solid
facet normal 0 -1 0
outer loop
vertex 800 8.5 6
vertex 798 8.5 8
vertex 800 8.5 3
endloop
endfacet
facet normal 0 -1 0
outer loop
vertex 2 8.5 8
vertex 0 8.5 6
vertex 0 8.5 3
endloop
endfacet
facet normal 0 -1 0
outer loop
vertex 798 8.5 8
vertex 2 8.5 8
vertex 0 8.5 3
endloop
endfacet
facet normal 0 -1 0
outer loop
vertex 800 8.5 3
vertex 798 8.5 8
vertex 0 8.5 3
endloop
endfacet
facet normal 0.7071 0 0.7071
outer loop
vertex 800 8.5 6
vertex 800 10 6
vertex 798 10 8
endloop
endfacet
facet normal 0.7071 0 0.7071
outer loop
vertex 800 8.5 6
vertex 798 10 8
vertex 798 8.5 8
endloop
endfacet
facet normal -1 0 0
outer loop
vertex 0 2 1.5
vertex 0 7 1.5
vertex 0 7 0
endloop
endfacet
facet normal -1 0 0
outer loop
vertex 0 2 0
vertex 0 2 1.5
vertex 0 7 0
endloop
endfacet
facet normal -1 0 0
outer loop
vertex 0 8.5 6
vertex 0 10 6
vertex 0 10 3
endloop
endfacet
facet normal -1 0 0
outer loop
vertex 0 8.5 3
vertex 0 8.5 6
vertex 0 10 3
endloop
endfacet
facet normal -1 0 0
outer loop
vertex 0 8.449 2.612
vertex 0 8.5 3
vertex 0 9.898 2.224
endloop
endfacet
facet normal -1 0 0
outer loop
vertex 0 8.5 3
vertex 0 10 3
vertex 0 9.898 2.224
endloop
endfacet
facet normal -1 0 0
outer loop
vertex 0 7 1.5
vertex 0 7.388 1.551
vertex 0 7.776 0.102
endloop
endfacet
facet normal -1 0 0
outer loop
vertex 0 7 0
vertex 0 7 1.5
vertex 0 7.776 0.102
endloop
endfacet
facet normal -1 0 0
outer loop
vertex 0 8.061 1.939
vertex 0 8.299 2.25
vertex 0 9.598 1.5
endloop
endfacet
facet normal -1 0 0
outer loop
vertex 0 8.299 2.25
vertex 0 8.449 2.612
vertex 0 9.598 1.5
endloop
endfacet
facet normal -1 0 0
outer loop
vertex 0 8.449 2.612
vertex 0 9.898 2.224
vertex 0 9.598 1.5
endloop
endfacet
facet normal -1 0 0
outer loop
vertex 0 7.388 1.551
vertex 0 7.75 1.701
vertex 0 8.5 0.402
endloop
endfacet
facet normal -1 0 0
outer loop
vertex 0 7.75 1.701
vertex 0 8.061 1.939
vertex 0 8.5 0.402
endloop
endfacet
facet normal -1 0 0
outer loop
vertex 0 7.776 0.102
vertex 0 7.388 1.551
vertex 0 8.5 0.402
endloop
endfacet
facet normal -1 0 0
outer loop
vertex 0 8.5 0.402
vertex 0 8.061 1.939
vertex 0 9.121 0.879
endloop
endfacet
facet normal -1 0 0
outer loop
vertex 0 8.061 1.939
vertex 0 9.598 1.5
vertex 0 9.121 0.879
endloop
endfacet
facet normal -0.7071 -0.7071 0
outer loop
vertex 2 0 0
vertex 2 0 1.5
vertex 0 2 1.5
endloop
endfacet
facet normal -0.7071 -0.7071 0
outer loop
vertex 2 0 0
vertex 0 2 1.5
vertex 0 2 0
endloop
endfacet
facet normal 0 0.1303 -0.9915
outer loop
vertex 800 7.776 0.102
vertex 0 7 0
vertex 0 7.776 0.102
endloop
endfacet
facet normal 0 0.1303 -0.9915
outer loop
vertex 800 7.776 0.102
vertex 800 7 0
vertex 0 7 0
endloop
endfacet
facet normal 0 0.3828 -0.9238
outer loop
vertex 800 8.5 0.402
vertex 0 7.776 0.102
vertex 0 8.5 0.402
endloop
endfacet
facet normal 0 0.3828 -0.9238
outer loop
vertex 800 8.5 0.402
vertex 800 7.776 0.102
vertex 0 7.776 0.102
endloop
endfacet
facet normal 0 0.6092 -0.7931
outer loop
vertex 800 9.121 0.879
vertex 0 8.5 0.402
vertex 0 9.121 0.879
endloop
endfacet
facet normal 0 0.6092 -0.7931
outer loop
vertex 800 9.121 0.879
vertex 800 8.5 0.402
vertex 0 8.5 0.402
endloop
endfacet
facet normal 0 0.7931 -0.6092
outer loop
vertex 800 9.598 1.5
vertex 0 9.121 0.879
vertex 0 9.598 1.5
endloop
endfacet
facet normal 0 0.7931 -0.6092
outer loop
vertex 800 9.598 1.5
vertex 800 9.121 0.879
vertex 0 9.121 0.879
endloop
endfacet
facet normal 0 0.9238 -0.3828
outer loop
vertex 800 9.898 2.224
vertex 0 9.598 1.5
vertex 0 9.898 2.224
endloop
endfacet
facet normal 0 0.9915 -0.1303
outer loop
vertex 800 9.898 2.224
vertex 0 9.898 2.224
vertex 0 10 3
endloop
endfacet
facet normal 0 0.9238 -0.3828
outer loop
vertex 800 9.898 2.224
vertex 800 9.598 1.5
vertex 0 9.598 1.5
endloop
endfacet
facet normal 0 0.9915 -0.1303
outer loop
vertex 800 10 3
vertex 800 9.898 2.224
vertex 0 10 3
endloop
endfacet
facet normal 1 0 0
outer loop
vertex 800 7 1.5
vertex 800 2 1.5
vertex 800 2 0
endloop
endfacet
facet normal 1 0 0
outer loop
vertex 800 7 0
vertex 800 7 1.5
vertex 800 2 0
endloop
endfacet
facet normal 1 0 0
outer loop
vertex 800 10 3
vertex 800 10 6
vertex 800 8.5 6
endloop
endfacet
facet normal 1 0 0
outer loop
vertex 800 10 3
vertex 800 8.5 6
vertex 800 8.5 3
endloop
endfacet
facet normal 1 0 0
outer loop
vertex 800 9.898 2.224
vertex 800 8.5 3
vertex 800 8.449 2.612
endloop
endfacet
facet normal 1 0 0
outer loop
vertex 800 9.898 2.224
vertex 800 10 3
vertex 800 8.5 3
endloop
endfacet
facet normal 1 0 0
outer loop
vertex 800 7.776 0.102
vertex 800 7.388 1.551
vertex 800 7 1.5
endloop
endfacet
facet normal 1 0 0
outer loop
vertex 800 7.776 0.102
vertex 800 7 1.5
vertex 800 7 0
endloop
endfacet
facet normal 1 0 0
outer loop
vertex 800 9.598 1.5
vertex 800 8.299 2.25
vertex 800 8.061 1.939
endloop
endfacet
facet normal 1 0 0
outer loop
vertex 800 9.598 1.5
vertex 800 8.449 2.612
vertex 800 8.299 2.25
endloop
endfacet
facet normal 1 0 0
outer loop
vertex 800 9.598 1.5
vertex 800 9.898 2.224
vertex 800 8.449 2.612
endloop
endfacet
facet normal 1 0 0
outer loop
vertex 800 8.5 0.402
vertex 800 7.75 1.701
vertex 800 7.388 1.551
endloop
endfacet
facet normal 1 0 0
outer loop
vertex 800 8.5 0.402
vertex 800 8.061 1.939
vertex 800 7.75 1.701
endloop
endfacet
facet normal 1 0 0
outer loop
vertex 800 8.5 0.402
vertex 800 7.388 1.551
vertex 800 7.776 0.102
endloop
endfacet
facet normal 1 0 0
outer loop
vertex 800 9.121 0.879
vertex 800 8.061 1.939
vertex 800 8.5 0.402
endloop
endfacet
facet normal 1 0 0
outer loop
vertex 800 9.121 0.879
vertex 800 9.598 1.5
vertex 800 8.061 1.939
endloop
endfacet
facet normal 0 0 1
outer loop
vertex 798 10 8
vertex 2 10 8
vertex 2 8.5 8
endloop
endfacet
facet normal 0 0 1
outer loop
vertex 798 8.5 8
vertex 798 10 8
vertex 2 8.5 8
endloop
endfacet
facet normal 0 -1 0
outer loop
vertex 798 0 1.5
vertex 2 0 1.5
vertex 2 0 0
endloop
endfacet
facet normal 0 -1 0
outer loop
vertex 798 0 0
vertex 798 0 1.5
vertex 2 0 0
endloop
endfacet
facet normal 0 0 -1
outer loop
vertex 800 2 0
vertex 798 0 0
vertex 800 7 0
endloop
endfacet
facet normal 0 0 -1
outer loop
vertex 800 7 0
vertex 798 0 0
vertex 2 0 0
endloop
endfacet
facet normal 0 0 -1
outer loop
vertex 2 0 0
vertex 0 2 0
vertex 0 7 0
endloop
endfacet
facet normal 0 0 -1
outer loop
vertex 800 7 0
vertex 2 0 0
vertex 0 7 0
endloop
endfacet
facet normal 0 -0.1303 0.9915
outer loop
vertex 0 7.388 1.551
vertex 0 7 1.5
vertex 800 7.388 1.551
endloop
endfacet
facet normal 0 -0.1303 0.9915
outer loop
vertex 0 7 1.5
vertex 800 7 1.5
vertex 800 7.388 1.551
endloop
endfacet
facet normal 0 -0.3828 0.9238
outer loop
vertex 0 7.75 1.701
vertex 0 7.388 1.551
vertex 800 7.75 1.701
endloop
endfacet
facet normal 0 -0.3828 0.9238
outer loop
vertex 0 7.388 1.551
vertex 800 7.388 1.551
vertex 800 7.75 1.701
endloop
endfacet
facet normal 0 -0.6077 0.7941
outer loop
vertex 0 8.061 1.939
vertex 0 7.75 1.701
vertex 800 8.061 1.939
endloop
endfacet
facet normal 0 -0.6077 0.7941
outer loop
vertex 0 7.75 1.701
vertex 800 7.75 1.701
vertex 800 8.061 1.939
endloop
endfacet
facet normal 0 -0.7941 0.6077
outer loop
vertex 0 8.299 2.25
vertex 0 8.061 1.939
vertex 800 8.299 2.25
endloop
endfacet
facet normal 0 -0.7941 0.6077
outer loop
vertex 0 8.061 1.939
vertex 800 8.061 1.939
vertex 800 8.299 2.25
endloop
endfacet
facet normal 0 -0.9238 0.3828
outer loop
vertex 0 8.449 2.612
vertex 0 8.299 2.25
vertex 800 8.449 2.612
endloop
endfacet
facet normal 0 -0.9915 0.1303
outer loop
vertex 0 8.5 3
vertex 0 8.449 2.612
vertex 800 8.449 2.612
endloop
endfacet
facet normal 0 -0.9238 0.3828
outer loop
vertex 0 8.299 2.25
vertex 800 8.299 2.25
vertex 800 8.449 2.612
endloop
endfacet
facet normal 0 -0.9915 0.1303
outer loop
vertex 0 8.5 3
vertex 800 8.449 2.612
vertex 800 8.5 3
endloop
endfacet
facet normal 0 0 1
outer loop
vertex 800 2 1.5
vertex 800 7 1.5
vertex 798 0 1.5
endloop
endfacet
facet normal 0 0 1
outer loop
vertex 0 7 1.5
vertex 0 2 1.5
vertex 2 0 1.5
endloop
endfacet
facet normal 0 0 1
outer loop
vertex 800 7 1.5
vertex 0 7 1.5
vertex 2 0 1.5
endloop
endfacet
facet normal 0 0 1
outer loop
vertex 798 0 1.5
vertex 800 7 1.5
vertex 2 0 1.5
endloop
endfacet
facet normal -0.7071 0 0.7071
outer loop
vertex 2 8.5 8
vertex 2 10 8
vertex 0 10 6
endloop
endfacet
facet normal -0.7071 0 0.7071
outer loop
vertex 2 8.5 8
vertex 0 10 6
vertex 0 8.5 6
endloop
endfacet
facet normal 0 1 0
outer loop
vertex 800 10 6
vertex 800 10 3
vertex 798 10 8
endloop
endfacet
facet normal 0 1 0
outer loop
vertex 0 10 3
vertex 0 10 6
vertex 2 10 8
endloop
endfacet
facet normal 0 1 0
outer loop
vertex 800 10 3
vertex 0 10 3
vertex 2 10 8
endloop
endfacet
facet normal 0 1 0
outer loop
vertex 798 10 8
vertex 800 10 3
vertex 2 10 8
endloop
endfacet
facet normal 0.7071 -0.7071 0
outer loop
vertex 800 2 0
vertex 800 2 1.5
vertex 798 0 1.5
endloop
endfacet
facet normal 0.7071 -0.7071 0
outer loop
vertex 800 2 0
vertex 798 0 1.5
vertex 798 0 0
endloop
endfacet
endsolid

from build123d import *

# Parameters (mm, degrees)
BOSS_EXTRUDE1_DEPTH = 800
FILLET1_R           = 3
FILLET2_R           = 1.5
CHAMFER1_SIZE       = 2


with BuildPart() as part:
    # Sketch1 → Boss-Extrude1 (new body)
    with BuildSketch(Plane(origin=(0, 0, 0), x_dir=(0, 0, -1), z_dir=(1, 0, 0))):
        Polygon((0, 0), (0, 10), (-8, 10), (-8, 8.5), (-1.5, 8.5), (-1.5, 0), align=None)
    extrude(amount=BOSS_EXTRUDE1_DEPTH)

    # Fillet1
    fillet1_edges = [part.edges().sort_by_distance(p)[0] for p in [
        (400, 10, 0),
    ]]
    fillet(fillet1_edges, radius=FILLET1_R)

    # Fillet2
    fillet2_edges = [part.edges().sort_by_distance(p)[0] for p in [
        (400, 8.5, 1.5),
    ]]
    fillet(fillet2_edges, radius=FILLET2_R)

    # Chamfer1
    chamfer1_edges = [part.edges().sort_by_distance(p)[0] for p in [
        (800, 9.25, 8),
        (800, 0, 0.75),
        (0, 9.25, 8),
        (0, 0, 0.75),
    ]]
    chamfer(chamfer1_edges, length=CHAMFER1_SIZE)


solid = part.part
